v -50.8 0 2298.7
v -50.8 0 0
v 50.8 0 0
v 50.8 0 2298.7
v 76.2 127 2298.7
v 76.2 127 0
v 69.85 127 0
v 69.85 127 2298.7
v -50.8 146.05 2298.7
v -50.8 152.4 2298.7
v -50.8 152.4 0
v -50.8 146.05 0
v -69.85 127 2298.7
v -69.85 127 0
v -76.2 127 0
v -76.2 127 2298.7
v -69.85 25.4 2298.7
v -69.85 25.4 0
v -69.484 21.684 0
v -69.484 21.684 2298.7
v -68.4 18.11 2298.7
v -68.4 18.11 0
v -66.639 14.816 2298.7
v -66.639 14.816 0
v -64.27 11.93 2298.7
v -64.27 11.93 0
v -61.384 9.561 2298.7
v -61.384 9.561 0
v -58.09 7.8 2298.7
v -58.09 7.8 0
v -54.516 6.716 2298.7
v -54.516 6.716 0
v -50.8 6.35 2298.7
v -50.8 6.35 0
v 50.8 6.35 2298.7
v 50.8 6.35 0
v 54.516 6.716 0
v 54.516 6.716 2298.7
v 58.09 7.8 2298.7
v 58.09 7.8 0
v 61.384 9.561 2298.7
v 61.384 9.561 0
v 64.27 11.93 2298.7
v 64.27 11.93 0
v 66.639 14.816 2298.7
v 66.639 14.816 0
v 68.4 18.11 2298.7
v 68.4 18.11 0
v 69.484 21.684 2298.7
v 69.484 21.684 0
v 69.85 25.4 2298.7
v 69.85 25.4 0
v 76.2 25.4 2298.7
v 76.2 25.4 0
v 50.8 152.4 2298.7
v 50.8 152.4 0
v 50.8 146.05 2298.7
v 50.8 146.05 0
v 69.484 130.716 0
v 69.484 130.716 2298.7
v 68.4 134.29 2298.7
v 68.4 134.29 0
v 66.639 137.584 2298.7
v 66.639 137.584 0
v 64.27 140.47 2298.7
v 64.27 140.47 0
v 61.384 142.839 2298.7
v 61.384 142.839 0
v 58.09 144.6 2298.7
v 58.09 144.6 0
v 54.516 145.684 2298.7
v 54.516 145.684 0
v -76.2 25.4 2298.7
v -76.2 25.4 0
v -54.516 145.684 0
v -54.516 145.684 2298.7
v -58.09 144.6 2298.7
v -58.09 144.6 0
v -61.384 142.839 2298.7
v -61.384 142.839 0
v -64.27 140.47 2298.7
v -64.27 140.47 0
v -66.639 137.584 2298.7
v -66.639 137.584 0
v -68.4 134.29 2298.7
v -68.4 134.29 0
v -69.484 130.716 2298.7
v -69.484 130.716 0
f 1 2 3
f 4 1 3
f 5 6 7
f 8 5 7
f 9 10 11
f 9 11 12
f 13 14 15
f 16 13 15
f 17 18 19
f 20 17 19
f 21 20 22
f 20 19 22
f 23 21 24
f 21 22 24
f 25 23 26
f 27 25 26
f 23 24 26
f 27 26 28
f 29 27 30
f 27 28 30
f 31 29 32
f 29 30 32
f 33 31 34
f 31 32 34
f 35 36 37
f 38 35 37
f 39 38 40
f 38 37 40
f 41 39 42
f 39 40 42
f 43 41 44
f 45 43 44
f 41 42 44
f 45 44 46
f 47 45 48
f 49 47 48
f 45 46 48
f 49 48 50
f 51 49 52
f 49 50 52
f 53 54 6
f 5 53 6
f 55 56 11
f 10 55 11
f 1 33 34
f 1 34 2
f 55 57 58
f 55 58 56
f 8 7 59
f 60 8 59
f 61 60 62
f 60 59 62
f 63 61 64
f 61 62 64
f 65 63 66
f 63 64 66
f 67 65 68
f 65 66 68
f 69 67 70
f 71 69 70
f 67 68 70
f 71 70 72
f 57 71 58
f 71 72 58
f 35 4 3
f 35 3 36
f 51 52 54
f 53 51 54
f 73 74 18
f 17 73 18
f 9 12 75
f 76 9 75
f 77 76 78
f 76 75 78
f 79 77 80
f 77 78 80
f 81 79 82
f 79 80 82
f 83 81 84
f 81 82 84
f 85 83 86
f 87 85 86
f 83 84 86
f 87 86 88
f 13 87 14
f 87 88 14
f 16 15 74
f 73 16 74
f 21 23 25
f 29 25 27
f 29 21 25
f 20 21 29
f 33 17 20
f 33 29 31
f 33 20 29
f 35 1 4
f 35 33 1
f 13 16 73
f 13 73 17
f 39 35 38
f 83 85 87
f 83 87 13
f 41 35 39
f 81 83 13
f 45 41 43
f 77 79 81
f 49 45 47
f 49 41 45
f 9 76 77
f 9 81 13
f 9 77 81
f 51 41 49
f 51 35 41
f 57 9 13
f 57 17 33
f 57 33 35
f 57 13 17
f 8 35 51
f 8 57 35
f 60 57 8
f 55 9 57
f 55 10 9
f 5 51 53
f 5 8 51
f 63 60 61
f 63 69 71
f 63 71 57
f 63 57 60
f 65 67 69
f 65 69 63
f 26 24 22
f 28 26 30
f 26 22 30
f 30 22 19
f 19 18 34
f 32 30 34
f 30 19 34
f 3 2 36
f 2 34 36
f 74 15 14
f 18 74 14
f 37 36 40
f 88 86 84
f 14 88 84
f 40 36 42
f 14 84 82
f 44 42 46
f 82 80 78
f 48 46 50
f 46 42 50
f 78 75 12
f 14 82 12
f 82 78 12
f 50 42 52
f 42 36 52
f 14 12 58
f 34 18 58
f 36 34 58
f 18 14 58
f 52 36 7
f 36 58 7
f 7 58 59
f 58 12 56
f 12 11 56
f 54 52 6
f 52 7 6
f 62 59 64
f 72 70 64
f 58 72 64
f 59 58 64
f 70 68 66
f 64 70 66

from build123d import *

# Parameters (mm, degrees)
F1_DEPTH = 2298.7


with BuildPart() as f1:
    # F0 (on Top) → F1 (new body)
    with BuildSketch(Plane.XY):
        with BuildLine():
            Line((-50.8, 0), (50.8, 0))
            Line((50.8, 0), (50.8, 6.35))
            ThreePointArc((50.8, 6.35), (64.270384, 11.929616), (69.85, 25.4))
            Line((69.85, 25.4), (76.2, 25.4))
            Line((76.2, 25.4), (76.2, 127))
            Line((76.2, 127), (69.85, 127))
            ThreePointArc((69.85, 127), (64.270384, 140.470384), (50.8, 146.05))
            Line((50.8, 146.05), (50.8, 152.4))
            Line((50.8, 152.4), (-50.8, 152.4))
            Line((-50.8, 152.4), (-50.8, 146.05))
            ThreePointArc((-50.8, 146.05), (-64.270384, 140.470384), (-69.85, 127))
            Line((-69.85, 127), (-76.2, 127))
            Line((-76.2, 127), (-76.2, 25.4))
            Line((-76.2, 25.4), (-69.85, 25.4))
            ThreePointArc((-69.85, 25.4), (-64.270384, 11.929616), (-50.8, 6.35))
            Line((-50.8, 6.35), (-50.8, 0))
        make_face()
    extrude(amount=F1_DEPTH)


solid = f1.part
